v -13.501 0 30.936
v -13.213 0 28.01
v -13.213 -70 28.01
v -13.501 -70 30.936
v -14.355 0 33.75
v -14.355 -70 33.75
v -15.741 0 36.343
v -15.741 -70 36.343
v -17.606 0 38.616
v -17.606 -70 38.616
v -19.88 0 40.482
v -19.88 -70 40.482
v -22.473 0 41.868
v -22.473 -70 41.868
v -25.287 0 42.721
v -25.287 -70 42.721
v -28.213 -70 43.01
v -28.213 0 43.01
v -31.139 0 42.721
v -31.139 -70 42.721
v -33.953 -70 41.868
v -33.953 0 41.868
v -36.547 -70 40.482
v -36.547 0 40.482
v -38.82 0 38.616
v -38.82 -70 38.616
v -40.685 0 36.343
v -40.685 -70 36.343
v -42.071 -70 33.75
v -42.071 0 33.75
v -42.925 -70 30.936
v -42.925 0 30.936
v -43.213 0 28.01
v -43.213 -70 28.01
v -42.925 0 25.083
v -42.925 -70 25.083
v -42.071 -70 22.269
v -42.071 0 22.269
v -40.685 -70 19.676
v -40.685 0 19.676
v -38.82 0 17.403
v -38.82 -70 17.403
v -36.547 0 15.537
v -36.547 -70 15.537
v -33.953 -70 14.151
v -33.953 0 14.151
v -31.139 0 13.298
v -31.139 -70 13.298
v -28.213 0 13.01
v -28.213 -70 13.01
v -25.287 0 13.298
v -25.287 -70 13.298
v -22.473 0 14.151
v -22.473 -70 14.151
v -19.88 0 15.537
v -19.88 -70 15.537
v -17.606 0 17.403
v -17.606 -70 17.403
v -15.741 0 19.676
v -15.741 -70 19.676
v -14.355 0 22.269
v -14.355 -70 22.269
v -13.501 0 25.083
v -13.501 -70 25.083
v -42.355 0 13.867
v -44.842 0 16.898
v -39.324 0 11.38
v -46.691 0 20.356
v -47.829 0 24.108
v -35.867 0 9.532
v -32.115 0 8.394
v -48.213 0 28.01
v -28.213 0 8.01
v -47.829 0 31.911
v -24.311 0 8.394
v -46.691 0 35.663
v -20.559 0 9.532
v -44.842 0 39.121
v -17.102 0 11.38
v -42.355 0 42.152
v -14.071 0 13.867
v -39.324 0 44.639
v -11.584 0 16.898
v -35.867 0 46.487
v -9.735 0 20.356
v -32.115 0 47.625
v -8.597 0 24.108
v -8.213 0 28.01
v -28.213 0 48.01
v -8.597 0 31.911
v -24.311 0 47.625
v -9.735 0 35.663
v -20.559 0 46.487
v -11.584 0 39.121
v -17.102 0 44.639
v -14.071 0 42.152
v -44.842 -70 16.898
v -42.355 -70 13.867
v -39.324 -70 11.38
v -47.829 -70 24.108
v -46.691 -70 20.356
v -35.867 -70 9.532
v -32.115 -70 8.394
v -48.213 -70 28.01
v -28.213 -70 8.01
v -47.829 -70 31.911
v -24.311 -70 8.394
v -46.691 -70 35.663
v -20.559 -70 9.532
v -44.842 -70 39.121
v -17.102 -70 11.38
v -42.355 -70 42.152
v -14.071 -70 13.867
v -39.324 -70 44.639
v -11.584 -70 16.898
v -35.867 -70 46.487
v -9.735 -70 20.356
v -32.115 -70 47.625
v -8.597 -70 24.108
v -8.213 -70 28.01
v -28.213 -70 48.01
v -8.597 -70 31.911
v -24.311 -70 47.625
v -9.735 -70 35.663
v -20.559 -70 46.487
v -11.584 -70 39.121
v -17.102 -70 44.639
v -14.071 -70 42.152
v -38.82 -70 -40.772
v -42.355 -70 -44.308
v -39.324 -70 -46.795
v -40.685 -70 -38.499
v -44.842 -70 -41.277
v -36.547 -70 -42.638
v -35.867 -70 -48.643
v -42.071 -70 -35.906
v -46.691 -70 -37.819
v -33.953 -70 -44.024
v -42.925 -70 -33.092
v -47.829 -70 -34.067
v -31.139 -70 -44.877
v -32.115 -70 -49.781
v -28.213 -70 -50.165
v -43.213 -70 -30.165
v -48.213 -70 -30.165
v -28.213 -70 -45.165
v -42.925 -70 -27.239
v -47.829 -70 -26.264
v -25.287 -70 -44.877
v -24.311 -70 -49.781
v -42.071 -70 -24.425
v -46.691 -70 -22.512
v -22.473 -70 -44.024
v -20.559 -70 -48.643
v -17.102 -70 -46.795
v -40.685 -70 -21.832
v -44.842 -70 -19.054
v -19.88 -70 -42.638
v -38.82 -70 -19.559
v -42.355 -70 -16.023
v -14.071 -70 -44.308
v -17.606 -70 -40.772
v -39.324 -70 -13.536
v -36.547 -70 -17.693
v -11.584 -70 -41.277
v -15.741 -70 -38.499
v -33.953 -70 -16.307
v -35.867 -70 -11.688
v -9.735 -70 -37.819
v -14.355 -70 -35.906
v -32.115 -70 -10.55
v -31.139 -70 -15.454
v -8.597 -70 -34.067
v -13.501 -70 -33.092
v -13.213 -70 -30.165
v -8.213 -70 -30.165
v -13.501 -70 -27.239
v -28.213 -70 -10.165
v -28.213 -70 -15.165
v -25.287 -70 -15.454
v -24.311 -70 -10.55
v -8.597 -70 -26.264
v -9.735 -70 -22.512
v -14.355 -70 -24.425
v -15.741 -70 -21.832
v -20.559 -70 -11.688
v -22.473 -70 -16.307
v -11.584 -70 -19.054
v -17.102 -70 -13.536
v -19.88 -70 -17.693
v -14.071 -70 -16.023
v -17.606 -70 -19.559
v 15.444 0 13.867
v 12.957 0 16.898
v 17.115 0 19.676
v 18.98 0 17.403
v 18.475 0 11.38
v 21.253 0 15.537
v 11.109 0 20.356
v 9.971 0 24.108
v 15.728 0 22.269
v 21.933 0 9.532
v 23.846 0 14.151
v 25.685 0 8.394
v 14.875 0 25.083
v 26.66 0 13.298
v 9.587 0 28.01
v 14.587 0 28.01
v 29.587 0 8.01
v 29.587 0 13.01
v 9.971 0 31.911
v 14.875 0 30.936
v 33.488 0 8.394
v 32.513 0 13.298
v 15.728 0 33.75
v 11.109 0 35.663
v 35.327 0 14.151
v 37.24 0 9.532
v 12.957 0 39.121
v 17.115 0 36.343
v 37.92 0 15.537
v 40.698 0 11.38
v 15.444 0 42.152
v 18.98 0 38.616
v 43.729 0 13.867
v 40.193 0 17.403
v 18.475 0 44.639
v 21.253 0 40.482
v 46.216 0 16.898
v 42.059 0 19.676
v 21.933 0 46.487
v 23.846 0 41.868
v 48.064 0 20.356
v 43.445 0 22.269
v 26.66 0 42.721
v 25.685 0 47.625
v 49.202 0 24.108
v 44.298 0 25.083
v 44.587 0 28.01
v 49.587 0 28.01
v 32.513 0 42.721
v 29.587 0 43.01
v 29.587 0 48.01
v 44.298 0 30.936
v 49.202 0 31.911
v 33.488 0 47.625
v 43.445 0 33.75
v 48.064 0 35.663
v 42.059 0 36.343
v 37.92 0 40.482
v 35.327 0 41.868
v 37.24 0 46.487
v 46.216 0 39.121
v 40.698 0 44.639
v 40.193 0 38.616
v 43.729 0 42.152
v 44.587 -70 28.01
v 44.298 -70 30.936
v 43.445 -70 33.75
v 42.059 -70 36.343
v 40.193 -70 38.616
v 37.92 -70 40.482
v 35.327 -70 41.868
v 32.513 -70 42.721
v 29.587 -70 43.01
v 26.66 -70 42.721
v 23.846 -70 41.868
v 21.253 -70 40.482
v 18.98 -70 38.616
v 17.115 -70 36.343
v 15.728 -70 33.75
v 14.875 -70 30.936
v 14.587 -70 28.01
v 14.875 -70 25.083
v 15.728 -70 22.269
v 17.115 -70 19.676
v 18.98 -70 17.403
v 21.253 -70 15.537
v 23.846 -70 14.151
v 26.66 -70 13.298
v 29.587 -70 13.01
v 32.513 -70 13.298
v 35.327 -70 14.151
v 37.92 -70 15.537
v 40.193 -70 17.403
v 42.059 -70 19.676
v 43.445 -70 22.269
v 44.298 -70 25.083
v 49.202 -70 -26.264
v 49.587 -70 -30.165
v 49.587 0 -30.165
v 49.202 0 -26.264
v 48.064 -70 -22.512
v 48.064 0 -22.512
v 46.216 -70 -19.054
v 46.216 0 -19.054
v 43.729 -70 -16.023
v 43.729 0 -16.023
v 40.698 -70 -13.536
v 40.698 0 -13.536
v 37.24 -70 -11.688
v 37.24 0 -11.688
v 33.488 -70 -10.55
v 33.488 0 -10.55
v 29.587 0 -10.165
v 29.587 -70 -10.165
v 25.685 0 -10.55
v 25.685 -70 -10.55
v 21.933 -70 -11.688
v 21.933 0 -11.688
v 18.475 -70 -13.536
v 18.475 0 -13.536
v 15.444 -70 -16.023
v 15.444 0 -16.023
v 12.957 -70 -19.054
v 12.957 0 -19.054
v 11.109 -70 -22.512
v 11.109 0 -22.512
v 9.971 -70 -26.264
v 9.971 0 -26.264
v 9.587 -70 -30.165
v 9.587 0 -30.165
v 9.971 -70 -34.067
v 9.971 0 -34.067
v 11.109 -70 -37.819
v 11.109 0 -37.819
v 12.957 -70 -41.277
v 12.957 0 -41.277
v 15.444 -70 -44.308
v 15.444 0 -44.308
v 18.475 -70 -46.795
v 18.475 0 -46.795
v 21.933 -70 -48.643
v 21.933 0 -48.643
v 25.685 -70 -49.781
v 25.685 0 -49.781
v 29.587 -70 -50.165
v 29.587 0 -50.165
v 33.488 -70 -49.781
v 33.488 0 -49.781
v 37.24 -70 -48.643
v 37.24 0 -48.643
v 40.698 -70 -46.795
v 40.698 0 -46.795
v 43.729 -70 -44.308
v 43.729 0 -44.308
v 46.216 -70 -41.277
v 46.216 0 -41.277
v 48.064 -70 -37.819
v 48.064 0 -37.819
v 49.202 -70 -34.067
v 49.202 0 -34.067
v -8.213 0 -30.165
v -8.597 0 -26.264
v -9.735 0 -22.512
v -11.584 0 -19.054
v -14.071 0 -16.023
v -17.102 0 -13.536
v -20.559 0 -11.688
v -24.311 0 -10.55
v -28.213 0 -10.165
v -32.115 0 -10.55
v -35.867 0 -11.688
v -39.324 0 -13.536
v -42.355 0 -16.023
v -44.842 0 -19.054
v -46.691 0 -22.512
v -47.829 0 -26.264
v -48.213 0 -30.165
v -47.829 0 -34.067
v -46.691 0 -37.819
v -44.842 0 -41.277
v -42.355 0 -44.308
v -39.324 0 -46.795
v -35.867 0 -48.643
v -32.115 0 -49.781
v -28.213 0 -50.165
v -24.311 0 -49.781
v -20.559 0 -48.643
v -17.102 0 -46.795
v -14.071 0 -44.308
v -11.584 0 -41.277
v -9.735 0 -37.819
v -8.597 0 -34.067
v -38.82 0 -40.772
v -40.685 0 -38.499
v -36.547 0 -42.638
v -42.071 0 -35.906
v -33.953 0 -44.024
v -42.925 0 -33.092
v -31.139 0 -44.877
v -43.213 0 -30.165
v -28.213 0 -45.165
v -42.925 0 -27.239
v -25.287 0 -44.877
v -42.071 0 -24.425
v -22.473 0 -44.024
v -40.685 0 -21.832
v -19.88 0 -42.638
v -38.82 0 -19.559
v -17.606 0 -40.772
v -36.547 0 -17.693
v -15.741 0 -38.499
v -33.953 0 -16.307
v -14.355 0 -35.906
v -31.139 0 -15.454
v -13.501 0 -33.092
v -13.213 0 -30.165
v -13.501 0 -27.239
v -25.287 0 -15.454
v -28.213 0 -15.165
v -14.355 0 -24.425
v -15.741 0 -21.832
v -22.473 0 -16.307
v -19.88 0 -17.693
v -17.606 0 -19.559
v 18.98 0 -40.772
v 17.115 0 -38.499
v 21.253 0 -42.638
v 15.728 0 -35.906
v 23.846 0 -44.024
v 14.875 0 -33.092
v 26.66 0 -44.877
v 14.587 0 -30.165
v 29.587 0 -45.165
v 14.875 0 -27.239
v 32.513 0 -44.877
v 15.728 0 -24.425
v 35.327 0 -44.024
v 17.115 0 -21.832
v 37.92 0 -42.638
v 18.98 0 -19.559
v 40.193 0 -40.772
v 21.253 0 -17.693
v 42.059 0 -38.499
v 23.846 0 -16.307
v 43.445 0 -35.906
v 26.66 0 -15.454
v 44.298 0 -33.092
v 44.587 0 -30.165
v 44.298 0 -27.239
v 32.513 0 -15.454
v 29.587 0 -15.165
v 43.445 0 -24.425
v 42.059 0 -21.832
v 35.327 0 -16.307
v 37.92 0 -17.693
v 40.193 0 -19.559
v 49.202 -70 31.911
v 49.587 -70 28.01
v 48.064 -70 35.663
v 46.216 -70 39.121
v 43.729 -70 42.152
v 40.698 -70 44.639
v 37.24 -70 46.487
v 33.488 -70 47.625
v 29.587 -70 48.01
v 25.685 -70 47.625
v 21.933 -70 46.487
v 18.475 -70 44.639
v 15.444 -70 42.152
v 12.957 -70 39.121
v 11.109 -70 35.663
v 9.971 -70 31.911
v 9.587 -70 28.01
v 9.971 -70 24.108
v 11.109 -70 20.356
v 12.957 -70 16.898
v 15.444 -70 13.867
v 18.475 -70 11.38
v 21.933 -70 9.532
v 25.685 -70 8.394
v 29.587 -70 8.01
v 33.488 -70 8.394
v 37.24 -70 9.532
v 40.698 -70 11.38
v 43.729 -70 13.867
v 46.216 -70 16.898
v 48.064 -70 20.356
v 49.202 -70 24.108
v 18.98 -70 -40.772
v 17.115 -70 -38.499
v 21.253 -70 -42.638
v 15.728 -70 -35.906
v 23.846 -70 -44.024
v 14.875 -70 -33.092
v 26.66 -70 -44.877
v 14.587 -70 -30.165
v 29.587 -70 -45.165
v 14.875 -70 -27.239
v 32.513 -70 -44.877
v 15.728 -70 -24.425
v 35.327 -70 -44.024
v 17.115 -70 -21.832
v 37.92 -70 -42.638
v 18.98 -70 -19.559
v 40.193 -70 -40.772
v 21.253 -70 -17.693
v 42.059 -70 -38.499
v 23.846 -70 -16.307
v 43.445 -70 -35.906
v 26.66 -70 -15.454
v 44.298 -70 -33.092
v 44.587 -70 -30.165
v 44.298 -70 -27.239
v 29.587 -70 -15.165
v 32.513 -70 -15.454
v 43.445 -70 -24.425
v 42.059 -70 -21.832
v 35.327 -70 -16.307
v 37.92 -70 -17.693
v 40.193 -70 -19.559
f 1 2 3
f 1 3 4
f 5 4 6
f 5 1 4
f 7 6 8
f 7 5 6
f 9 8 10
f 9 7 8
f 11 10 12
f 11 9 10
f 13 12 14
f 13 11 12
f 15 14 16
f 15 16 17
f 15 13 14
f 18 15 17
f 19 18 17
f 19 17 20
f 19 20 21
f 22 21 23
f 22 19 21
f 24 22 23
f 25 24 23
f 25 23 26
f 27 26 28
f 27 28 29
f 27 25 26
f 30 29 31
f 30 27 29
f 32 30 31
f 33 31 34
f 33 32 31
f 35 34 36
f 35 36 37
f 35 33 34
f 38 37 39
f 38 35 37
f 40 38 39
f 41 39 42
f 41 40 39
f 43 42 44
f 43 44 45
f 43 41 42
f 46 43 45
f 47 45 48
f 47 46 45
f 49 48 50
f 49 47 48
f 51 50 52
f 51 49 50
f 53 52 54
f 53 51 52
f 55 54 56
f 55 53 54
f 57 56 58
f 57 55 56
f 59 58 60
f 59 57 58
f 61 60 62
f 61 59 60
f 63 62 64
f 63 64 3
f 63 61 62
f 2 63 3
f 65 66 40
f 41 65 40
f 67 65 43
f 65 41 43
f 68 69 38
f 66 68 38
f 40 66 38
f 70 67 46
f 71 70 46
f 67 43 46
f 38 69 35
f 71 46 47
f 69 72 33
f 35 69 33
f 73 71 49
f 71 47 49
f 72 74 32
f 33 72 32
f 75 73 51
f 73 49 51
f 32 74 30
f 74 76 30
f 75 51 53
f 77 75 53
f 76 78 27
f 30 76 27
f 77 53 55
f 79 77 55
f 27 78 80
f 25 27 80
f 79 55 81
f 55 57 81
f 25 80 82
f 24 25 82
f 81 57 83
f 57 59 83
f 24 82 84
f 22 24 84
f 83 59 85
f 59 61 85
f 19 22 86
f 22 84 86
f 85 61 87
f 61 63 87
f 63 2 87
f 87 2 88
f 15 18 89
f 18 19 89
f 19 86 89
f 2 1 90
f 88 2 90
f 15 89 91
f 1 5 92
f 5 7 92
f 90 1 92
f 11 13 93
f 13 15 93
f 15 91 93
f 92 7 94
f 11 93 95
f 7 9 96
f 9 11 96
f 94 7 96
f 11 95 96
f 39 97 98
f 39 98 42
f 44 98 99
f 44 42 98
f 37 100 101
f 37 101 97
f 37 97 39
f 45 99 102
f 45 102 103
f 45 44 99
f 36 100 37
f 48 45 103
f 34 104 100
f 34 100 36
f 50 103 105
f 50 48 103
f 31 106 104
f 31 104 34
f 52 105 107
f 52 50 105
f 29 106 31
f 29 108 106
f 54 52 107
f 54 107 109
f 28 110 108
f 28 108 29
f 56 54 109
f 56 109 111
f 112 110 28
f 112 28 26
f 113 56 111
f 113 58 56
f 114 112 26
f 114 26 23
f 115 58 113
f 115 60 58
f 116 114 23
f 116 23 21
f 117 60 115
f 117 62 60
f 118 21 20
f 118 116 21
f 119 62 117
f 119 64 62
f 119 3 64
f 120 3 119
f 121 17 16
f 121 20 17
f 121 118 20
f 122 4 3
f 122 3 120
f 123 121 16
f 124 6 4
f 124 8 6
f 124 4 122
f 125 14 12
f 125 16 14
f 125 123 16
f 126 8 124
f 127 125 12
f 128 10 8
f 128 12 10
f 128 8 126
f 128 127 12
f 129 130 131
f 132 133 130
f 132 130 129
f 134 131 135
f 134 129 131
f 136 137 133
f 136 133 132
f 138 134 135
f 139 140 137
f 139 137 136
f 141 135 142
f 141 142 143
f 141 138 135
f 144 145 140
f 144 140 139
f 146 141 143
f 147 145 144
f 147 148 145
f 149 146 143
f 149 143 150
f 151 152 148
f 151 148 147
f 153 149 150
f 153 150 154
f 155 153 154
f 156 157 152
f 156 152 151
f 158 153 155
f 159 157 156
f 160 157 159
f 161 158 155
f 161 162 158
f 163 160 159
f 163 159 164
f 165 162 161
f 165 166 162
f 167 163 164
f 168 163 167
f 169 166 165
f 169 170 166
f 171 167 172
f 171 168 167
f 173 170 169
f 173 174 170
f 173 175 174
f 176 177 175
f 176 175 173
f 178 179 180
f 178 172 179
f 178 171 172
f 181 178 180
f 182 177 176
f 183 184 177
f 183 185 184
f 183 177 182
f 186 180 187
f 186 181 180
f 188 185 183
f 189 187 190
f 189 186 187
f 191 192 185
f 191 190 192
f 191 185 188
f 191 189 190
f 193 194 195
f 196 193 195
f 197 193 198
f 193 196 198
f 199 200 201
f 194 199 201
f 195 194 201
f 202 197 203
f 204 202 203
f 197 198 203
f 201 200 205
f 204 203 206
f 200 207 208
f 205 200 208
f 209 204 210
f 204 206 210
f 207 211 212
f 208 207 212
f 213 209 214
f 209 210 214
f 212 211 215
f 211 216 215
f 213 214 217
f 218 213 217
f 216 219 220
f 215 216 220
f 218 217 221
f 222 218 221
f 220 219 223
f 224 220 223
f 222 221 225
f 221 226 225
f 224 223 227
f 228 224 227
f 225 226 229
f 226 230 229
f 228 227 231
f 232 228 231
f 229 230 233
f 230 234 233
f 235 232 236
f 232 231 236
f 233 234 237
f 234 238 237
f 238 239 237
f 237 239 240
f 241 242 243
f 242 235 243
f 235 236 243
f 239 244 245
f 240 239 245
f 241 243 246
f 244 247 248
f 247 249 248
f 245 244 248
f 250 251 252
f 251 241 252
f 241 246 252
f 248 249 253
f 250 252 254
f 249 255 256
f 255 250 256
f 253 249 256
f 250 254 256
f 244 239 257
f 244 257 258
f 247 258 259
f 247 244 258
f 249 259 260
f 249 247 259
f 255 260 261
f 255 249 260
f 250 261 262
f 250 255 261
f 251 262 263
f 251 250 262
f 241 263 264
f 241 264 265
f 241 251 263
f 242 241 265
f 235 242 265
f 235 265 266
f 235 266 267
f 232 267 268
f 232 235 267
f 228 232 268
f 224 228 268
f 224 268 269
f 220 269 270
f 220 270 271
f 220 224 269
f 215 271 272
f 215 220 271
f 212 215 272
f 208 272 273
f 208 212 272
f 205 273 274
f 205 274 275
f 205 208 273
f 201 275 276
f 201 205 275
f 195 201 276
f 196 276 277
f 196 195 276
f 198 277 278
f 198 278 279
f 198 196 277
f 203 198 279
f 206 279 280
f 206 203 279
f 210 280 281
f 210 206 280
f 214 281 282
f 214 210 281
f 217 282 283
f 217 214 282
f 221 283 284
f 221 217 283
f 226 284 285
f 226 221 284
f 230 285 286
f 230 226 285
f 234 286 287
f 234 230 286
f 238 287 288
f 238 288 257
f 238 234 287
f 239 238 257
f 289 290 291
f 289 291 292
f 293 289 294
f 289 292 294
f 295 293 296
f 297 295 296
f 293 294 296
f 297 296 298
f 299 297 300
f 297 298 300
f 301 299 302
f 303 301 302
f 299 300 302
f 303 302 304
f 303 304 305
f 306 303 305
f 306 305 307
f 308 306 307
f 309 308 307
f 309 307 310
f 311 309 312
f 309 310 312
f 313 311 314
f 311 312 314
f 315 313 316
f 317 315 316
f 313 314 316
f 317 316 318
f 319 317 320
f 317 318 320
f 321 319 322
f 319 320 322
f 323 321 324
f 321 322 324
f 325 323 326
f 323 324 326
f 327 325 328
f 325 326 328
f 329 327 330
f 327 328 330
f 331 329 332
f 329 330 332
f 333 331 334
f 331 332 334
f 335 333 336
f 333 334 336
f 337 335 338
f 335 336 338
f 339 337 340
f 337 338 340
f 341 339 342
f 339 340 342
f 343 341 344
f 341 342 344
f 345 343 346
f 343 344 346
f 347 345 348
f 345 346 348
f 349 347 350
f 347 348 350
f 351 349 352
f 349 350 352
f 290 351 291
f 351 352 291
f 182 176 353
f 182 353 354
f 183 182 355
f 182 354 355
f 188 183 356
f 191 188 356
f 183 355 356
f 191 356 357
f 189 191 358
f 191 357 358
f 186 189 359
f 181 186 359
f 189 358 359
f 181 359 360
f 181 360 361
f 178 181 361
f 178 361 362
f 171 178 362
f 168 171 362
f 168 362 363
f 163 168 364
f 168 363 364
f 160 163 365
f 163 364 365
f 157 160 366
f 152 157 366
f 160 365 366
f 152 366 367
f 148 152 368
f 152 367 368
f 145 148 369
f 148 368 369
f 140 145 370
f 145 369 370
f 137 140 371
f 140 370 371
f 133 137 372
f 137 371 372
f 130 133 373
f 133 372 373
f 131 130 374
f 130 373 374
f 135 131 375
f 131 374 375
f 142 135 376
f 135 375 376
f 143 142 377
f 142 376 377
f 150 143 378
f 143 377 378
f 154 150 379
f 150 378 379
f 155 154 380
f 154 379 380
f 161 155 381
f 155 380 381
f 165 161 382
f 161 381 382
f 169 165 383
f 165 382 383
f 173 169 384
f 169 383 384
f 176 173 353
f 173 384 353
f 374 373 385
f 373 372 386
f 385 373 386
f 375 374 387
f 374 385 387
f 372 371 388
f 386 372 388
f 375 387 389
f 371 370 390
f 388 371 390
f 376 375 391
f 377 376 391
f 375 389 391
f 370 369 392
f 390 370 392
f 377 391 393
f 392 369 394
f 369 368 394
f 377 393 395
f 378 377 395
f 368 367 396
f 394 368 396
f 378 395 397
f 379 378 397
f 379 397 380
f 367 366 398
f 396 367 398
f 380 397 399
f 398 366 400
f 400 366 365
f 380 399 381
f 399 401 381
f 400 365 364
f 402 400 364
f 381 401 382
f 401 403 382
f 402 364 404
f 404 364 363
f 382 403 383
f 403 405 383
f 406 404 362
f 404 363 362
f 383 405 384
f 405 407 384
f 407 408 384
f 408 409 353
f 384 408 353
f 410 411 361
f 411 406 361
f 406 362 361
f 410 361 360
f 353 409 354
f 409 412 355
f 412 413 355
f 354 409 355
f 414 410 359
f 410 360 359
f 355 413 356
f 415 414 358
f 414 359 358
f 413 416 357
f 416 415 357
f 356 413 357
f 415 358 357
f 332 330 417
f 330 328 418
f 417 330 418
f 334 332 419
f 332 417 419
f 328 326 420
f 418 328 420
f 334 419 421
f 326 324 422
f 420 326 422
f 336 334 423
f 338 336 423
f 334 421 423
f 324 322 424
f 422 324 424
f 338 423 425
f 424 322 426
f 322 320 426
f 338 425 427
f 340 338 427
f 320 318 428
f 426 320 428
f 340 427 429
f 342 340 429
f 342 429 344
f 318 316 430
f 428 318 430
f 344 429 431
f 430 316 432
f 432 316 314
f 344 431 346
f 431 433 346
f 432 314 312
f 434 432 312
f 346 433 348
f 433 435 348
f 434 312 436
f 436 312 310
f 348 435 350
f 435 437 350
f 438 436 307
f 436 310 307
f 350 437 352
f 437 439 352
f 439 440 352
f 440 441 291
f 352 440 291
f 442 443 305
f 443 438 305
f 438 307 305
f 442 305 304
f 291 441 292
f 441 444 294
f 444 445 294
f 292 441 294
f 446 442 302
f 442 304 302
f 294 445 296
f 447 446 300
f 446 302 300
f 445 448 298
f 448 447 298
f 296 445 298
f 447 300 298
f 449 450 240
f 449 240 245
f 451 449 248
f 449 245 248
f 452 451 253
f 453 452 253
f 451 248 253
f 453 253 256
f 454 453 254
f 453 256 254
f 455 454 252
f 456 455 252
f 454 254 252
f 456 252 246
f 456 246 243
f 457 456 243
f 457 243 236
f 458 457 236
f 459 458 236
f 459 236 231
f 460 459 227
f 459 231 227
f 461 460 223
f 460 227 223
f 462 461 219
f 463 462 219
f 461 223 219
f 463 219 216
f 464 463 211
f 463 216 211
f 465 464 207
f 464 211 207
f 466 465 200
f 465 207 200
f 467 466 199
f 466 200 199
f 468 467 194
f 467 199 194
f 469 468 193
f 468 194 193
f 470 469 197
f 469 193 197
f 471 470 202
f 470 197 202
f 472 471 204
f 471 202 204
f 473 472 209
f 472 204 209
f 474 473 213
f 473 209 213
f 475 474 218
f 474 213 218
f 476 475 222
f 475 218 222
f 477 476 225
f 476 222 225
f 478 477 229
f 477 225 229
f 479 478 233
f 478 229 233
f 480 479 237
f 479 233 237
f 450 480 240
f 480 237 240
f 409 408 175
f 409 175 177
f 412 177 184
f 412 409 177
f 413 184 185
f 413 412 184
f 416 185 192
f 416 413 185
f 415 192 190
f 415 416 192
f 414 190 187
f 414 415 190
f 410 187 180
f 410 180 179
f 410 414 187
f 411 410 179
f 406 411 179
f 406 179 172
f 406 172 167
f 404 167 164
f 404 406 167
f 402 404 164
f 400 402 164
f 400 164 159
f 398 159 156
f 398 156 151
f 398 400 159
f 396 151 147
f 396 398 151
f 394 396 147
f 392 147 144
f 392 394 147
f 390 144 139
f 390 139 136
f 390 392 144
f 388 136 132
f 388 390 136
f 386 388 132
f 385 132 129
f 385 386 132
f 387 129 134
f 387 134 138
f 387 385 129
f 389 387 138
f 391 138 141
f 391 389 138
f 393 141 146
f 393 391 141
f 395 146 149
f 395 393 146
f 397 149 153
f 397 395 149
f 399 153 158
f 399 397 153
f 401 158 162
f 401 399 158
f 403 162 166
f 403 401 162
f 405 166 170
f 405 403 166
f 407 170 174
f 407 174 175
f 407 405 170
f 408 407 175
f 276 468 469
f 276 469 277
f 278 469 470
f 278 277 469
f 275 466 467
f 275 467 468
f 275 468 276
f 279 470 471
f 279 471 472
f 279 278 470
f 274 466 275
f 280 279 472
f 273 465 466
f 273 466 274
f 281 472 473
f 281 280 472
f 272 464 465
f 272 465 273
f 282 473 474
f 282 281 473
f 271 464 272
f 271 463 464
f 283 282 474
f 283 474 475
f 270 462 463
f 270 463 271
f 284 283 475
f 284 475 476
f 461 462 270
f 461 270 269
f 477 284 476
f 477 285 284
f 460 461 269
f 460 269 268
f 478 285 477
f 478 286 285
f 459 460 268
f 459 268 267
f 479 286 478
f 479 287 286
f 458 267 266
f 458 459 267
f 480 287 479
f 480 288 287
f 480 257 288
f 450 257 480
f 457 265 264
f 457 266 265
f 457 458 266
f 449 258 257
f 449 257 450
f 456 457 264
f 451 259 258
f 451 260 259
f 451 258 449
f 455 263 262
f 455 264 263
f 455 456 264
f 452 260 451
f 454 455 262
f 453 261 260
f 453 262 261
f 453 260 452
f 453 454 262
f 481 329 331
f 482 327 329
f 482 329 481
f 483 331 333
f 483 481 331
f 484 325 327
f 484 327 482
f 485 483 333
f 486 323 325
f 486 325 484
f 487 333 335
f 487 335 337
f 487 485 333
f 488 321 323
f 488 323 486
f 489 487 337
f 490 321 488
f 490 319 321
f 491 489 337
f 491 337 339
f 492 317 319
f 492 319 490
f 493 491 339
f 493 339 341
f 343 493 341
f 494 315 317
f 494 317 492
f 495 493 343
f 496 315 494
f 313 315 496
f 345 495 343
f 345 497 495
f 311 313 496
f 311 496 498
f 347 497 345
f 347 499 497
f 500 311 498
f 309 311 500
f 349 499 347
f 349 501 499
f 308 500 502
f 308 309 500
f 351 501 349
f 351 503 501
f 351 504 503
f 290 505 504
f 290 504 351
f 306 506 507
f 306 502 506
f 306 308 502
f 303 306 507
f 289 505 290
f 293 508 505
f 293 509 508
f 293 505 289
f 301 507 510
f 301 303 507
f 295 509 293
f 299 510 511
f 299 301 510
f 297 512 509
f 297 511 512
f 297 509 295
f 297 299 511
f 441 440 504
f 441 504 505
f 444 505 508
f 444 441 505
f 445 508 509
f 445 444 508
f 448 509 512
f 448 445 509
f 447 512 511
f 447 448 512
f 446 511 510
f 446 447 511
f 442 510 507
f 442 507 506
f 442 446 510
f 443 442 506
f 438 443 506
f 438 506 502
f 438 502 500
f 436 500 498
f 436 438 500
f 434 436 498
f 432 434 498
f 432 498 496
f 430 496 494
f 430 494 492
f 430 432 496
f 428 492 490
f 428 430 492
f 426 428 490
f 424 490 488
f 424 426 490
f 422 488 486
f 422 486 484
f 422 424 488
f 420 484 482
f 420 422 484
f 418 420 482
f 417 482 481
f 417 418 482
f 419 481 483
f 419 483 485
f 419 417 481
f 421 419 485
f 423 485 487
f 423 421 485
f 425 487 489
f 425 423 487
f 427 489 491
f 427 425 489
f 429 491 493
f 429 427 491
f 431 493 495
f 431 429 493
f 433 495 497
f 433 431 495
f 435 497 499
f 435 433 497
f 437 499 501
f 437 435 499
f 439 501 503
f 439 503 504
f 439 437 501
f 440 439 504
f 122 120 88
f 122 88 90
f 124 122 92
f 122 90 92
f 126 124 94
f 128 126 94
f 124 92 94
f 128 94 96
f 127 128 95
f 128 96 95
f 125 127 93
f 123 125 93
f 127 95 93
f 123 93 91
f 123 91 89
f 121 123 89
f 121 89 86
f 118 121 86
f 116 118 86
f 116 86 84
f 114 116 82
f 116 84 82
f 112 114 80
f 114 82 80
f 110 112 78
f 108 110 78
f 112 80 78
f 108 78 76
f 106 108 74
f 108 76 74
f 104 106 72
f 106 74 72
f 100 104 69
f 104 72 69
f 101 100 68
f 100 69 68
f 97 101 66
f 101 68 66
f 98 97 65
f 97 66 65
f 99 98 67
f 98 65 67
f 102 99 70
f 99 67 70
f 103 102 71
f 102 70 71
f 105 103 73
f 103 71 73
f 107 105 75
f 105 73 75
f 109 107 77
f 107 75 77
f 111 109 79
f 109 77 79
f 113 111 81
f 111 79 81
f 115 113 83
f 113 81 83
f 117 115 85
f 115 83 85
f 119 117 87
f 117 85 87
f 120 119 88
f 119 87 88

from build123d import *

# Parameters (mm, degrees)
F0_R     = 20
F0_R_2   = 15
F1_DEPTH = 70


with BuildPart() as f1:
    # F0 (on Front) → F1 (new body)
    with BuildSketch(Plane.XZ):
        with Locations((-28.213074, 28.009528)):
            Circle(F0_R)
        with Locations((-28.213074, 28.009528)):
            Circle(F0_R_2, mode=Mode.SUBTRACT)
        with Locations((29.586622, 28.009528)):
            Circle(F0_R)
        with Locations((29.586622, 28.009528)):
            Circle(F0_R_2, mode=Mode.SUBTRACT)
        with Locations((29.586622, -30.165494)):
            Circle(F0_R)
        with Locations((29.586622, -30.165494)):
            Circle(F0_R_2, mode=Mode.SUBTRACT)
        with Locations((-28.213074, -30.165494)):
            Circle(F0_R)
        with Locations((-28.213074, -30.165494)):
            Circle(F0_R_2, mode=Mode.SUBTRACT)
    extrude(amount=F1_DEPTH)


solid = f1.part
